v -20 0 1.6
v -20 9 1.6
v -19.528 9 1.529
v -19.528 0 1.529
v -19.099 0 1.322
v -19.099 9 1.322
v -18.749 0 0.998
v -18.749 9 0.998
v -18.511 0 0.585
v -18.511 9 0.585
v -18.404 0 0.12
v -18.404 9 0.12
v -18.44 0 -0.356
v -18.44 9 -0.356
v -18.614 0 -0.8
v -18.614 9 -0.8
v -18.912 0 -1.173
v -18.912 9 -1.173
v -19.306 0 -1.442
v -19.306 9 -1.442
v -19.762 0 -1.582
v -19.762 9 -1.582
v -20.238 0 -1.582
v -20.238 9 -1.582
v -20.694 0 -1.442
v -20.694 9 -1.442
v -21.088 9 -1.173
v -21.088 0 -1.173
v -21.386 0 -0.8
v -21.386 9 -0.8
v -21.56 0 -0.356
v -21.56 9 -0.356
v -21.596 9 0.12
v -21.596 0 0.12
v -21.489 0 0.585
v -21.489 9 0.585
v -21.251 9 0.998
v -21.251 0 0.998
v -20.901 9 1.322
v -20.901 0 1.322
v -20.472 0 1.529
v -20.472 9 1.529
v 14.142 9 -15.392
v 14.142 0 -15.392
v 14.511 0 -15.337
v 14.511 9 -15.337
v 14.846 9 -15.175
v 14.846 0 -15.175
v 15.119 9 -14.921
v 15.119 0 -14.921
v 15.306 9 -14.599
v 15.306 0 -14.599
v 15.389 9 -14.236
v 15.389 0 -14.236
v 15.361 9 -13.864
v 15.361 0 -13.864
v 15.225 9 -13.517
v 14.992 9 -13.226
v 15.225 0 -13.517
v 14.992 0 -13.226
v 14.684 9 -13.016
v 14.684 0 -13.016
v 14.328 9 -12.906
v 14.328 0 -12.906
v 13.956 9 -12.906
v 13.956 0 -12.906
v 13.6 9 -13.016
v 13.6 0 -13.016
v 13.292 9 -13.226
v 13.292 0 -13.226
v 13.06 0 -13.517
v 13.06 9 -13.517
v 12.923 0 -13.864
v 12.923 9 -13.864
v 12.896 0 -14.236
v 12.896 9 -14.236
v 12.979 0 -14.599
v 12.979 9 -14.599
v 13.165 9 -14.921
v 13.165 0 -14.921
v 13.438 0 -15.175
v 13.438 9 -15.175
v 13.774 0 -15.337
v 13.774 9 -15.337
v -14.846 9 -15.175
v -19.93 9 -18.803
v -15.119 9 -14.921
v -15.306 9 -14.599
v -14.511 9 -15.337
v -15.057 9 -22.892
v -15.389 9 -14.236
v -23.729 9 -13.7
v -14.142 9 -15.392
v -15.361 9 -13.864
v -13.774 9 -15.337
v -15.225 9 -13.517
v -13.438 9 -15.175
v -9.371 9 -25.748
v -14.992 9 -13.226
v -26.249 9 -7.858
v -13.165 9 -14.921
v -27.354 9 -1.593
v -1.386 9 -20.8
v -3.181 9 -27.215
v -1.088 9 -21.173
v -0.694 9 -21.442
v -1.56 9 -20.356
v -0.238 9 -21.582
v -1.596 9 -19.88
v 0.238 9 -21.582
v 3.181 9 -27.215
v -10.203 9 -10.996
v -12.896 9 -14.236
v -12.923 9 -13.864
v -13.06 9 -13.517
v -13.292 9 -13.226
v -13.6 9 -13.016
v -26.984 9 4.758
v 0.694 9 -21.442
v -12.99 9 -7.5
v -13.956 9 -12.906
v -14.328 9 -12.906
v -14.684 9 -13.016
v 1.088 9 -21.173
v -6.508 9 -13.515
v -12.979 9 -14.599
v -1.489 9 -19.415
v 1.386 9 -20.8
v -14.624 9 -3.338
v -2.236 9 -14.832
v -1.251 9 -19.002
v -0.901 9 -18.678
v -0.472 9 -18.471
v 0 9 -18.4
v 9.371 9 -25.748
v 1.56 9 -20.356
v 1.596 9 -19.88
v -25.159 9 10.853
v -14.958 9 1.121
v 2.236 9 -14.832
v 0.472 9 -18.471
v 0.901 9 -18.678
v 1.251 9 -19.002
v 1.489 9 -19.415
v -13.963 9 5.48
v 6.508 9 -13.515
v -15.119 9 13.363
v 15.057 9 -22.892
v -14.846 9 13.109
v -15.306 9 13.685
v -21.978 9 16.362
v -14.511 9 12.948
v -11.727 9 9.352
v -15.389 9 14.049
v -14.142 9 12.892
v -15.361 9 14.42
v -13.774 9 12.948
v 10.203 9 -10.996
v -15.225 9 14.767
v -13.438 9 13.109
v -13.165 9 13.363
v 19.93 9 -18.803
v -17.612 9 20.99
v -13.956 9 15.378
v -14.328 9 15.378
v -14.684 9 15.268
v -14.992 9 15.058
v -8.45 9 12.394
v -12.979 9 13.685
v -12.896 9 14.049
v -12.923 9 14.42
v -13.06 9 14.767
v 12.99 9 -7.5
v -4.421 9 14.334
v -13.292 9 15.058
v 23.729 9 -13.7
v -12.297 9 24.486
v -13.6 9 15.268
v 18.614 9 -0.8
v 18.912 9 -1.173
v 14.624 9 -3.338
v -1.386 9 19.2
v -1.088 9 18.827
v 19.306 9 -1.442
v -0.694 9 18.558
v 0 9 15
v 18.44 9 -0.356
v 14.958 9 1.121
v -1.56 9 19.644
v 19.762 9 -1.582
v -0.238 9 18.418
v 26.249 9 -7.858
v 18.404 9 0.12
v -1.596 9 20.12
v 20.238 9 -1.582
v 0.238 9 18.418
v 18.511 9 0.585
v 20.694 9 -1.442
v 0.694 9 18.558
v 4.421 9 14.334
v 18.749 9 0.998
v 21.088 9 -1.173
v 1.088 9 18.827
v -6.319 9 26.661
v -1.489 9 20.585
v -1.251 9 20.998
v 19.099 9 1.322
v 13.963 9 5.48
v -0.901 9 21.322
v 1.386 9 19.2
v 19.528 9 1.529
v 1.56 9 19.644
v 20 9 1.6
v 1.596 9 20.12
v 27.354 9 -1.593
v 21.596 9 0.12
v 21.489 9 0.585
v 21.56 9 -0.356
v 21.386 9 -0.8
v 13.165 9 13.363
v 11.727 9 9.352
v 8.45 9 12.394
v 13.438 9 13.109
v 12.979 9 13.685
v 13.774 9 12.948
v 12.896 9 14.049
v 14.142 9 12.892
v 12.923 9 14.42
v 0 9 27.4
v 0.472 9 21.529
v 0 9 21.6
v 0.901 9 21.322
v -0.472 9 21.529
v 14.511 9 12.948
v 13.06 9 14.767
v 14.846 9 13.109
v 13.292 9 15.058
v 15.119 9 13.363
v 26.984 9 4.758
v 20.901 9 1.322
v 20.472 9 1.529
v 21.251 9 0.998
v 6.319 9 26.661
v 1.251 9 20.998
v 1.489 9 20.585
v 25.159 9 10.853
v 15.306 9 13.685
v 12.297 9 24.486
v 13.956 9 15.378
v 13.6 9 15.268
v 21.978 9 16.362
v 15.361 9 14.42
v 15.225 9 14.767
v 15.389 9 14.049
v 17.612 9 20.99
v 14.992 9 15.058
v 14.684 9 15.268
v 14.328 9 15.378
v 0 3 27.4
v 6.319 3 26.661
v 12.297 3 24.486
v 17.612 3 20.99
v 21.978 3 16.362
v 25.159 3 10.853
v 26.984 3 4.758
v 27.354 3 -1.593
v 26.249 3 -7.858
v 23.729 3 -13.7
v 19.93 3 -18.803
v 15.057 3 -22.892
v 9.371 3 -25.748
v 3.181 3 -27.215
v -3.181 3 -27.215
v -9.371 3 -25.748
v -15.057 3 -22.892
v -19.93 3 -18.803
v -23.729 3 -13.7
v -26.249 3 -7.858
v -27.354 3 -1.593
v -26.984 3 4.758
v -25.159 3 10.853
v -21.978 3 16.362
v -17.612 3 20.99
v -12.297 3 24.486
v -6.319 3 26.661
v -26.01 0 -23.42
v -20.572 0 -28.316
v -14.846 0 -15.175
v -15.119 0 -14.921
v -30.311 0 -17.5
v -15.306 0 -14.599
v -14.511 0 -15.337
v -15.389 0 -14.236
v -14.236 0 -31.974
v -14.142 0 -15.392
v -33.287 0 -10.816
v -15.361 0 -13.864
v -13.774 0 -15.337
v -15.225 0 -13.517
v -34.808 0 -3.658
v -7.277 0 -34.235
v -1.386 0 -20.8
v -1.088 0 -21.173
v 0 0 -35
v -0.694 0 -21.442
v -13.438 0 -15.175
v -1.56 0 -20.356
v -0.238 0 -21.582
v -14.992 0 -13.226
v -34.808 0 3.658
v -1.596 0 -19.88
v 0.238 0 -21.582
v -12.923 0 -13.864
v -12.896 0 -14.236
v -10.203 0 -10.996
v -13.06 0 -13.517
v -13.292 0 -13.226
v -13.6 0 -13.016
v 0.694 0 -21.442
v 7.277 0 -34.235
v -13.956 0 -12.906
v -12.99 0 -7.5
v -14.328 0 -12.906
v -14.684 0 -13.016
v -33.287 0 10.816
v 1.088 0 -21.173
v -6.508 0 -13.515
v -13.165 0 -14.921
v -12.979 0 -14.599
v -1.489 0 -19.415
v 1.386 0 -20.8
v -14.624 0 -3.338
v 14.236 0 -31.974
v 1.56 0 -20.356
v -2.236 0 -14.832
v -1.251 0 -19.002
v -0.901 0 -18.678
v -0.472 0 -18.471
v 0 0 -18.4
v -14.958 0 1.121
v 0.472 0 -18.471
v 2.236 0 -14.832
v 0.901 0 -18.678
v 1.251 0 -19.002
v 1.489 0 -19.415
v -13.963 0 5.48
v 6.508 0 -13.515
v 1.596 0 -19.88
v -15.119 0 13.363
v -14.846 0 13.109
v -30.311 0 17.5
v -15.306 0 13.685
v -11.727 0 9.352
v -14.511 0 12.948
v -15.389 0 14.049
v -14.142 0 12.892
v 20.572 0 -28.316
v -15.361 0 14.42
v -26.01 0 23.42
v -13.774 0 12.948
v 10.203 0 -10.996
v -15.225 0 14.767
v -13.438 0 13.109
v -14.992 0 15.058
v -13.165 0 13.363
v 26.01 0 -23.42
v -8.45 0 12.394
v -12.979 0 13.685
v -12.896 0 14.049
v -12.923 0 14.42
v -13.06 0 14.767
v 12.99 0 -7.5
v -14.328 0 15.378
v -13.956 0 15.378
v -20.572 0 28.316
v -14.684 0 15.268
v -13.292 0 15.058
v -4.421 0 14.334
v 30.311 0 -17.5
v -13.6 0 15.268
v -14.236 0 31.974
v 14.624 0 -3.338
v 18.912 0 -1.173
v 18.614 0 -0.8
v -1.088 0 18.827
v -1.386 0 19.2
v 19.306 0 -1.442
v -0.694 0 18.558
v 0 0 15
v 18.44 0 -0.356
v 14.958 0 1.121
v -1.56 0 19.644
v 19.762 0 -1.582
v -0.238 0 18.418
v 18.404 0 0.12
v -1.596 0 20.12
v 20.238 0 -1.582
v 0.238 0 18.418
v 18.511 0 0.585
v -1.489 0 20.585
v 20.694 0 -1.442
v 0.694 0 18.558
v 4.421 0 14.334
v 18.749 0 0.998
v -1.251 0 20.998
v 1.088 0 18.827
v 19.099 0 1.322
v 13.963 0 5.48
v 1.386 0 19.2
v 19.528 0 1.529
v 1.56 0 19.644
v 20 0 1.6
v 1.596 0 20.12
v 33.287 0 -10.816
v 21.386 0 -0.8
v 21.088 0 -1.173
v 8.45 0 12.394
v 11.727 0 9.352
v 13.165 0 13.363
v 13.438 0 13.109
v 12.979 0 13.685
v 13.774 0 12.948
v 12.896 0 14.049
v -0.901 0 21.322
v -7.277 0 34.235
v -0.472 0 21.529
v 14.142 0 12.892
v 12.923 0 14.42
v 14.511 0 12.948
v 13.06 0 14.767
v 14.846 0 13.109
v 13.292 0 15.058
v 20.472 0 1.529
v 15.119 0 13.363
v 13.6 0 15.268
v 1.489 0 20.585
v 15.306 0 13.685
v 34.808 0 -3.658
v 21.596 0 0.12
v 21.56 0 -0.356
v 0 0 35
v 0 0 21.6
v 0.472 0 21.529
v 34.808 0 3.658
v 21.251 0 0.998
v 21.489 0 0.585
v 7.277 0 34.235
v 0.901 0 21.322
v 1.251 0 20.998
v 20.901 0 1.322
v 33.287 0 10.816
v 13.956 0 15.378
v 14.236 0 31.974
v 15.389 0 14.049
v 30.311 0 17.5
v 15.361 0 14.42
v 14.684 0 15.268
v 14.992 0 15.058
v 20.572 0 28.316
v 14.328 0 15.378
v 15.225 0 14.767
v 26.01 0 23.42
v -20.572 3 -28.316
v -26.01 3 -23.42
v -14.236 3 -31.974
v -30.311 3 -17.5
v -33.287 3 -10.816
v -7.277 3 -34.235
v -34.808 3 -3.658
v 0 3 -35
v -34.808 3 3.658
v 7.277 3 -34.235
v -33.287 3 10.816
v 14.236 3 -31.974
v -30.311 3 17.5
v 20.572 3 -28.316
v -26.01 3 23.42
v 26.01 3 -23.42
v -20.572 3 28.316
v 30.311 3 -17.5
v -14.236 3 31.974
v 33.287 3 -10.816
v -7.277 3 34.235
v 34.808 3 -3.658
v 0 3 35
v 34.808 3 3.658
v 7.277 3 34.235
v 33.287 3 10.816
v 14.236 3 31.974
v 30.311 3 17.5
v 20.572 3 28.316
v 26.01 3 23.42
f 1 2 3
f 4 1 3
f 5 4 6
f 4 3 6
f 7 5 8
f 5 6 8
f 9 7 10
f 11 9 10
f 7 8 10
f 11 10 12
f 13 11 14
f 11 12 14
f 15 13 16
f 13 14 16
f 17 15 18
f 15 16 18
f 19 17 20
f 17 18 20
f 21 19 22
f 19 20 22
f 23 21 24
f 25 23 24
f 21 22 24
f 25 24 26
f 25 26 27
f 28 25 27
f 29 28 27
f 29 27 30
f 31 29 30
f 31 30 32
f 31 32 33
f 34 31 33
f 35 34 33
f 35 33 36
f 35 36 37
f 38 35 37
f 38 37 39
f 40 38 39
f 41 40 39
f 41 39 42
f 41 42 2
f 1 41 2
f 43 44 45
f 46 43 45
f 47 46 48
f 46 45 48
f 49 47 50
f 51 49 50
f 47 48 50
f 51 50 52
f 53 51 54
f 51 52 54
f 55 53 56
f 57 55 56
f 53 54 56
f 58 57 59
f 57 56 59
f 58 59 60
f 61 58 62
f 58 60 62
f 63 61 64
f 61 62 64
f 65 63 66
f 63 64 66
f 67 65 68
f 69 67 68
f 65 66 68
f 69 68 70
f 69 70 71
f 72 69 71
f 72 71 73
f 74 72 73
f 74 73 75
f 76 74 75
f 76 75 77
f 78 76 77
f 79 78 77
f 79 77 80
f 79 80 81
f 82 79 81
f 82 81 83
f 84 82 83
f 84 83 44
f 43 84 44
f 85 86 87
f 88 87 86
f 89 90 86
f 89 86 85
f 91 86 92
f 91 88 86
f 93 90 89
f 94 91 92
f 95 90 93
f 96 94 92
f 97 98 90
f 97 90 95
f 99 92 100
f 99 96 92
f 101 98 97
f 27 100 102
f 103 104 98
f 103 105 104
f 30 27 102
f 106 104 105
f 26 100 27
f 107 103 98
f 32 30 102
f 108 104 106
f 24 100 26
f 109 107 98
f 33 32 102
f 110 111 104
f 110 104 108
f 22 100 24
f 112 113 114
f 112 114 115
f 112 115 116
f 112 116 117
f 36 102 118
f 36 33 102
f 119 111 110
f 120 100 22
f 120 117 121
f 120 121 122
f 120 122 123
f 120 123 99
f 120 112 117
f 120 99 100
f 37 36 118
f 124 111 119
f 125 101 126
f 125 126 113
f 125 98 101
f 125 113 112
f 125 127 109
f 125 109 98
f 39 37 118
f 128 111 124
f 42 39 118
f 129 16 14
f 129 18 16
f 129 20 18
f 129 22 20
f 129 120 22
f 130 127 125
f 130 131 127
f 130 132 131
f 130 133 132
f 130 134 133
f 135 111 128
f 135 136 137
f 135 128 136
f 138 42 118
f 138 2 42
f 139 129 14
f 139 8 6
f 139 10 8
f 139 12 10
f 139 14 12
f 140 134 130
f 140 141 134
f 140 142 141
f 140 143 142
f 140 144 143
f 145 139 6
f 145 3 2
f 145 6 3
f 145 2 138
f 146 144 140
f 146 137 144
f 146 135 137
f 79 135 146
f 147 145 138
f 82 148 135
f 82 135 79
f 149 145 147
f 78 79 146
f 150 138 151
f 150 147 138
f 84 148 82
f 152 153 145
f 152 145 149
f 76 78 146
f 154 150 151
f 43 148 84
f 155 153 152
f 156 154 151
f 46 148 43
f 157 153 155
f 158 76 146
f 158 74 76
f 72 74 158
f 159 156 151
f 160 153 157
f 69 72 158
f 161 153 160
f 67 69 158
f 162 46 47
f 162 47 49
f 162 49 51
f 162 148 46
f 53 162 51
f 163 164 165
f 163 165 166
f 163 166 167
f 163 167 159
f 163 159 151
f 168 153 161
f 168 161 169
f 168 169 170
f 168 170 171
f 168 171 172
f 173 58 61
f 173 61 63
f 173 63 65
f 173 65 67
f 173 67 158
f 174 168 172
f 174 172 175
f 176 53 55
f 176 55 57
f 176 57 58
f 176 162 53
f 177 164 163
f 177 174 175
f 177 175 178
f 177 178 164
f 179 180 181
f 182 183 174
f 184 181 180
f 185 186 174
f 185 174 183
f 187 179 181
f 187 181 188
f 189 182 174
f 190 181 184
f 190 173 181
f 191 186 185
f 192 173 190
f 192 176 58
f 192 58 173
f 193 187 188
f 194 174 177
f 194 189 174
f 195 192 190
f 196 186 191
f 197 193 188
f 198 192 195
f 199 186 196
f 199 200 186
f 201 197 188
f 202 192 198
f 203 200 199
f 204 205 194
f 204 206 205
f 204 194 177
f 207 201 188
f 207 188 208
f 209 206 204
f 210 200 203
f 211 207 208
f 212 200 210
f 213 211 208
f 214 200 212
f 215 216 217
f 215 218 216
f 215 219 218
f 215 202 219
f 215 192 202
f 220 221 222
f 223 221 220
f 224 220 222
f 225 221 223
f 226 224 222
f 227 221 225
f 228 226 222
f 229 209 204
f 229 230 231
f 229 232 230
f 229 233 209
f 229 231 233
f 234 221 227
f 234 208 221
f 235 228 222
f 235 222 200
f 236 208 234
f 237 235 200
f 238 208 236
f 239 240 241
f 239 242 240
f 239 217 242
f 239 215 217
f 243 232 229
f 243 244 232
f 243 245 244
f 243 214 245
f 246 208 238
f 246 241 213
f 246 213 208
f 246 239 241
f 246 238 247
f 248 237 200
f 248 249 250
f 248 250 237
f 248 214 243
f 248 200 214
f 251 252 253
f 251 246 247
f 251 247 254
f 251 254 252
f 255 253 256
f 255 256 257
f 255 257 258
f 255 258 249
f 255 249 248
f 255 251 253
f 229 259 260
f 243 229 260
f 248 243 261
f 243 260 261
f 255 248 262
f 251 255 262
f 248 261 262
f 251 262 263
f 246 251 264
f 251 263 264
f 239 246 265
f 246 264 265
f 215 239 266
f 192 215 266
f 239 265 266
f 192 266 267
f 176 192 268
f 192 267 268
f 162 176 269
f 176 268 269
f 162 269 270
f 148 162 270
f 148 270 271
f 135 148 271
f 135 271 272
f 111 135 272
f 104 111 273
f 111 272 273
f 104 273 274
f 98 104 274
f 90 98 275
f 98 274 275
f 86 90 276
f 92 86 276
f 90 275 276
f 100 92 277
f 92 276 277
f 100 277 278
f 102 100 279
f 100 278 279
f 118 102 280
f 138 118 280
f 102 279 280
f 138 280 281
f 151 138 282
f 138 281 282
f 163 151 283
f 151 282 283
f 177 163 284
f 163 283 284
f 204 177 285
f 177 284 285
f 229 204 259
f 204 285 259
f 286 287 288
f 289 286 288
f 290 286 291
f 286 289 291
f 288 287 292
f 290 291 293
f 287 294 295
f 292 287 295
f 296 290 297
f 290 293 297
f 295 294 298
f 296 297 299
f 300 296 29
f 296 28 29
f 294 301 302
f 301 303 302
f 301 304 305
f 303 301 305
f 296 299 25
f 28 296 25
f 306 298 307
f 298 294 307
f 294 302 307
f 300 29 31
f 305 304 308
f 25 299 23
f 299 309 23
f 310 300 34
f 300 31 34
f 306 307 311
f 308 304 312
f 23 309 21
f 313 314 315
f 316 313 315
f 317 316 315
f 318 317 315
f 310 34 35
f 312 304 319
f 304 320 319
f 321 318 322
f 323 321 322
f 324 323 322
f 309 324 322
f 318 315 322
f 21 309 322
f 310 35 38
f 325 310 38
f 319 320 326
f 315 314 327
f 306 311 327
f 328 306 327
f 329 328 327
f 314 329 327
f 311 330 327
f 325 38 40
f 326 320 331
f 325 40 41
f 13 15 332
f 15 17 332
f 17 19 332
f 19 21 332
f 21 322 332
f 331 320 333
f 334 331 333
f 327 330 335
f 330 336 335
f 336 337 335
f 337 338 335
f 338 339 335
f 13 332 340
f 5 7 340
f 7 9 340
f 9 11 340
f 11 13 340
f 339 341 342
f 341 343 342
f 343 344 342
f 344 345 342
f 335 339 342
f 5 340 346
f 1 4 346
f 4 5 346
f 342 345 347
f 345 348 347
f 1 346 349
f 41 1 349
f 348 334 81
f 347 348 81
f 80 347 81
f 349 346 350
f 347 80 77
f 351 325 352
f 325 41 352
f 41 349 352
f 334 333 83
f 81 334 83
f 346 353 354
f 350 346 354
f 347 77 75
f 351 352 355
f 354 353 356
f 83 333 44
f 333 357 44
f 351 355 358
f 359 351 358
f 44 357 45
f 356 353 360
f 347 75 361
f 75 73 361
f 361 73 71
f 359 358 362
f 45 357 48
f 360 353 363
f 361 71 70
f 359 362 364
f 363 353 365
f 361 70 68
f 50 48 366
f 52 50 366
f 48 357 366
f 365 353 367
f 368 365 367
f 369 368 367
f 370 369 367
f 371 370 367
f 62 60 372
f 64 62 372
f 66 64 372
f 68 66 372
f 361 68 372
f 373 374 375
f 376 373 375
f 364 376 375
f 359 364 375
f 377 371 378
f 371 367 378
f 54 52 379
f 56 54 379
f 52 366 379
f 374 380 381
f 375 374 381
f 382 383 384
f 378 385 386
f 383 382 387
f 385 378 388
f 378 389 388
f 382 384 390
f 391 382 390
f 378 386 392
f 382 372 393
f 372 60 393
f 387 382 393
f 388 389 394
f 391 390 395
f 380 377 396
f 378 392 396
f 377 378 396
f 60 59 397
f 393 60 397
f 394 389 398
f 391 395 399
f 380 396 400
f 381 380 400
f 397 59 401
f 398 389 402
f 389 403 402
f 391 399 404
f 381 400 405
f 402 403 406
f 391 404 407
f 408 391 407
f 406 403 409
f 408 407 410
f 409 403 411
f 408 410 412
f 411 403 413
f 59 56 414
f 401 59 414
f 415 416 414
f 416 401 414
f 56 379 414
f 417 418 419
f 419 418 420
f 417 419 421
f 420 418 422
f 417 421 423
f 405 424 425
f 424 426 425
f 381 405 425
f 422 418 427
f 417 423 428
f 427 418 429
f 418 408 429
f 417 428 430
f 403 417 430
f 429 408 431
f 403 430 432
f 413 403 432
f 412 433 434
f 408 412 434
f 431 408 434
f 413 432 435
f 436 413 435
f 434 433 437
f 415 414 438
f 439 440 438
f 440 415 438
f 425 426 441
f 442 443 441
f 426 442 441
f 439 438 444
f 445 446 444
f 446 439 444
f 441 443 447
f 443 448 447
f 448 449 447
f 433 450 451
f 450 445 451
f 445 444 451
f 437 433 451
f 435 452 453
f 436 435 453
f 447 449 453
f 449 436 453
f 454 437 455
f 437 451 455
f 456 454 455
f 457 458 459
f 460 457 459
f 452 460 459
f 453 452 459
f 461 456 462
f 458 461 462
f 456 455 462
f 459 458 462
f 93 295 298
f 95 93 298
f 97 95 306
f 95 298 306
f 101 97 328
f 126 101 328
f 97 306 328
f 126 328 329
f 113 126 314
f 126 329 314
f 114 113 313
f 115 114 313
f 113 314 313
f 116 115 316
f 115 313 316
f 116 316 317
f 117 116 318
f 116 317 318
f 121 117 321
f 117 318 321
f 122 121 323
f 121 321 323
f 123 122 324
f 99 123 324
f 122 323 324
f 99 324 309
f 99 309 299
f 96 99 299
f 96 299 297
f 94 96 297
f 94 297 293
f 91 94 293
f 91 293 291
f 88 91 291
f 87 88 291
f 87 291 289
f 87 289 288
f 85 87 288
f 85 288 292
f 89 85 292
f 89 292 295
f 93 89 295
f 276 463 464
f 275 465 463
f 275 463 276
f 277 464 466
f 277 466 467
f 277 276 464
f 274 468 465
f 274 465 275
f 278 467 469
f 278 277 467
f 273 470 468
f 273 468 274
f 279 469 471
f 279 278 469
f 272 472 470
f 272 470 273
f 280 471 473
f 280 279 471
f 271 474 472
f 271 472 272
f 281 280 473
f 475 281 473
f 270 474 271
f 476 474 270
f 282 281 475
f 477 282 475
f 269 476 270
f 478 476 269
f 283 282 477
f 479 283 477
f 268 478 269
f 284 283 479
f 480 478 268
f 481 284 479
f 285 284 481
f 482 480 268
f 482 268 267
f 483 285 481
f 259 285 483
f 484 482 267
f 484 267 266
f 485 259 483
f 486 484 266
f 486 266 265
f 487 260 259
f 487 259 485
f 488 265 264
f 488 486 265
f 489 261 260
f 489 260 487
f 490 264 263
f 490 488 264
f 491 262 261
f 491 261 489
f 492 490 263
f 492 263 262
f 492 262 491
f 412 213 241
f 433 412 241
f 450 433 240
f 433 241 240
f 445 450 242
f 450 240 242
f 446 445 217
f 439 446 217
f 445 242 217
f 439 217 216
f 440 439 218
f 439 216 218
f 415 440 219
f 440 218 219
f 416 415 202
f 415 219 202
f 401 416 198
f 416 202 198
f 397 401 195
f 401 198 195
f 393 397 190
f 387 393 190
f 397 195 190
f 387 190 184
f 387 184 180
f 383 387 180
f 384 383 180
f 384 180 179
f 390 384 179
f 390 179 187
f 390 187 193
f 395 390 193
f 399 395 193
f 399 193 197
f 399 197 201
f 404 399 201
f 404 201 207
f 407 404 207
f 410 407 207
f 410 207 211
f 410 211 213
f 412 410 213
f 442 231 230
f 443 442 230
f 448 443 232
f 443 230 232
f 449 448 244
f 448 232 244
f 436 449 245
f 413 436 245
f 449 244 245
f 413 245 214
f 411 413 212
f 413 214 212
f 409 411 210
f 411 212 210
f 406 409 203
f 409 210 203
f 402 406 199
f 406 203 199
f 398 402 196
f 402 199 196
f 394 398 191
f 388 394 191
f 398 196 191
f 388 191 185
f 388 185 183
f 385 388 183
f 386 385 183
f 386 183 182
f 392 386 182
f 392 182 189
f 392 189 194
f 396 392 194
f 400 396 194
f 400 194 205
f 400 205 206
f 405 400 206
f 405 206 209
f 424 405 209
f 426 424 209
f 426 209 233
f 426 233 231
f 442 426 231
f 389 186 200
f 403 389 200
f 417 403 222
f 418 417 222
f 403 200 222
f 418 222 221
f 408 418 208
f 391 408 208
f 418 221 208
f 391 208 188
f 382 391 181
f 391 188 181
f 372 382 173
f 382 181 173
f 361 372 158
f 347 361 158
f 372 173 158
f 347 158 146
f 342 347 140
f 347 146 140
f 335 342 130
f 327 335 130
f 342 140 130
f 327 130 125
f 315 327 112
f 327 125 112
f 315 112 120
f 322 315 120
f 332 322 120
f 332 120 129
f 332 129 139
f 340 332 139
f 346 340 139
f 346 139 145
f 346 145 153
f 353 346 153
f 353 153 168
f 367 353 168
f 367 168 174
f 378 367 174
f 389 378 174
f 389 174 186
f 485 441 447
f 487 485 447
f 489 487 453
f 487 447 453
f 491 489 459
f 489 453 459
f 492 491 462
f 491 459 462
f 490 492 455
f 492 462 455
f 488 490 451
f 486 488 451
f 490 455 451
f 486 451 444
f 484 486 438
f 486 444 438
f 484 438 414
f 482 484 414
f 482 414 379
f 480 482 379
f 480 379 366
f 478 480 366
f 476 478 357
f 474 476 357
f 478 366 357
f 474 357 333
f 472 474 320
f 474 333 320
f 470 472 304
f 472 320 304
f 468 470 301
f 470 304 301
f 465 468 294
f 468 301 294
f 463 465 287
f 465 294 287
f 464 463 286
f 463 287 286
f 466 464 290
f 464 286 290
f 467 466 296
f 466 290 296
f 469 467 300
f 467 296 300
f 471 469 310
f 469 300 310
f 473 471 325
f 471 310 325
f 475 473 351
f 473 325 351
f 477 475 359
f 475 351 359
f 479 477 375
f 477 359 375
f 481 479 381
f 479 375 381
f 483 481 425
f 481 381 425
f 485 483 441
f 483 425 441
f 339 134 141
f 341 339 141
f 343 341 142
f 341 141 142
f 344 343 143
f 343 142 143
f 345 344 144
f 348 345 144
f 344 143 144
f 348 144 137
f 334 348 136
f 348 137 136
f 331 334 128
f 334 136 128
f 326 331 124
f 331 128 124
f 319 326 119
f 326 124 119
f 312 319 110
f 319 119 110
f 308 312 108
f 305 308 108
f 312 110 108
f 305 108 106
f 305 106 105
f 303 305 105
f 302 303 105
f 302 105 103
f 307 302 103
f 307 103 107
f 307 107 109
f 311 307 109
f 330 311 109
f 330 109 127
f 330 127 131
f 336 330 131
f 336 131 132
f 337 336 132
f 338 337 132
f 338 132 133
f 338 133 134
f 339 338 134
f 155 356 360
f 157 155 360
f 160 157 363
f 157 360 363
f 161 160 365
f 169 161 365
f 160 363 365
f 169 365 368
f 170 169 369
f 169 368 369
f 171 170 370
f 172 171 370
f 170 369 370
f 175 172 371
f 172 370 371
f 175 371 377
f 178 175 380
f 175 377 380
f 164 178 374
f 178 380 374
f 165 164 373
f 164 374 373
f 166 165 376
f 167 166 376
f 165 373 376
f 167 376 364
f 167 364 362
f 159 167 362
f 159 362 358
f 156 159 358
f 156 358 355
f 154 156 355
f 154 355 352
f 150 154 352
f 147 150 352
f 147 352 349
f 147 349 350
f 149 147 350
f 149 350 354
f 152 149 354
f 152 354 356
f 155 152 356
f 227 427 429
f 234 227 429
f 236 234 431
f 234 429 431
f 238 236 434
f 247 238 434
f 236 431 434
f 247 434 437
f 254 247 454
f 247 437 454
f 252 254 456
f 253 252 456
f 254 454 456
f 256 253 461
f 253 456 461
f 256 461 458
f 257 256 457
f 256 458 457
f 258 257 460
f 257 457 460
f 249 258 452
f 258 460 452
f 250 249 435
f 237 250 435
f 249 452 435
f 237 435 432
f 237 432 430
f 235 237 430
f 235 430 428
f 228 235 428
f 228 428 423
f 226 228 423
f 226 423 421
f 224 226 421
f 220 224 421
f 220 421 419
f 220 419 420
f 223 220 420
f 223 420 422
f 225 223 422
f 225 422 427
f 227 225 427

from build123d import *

# Parameters (mm, degrees)
SKETCH_1_R          = 35
EXTRUDE_1_DEPTH     = 3
SKETCH_2_R          = 27.4
EXTRUDE_2_DEPTH     = 6
SKETCH_3_R          = 1.6
CUT_EXTRUDE_1_DEPTH = 51.309044912
SKETCH_4_R          = 15
CUT_EXTRUDE_2_DEPTH = 51.309044912
SKETCH_5_R          = 1.25
CUT_EXTRUDE_3_DEPTH = 51.309044912


with BuildPart() as part:
    # ｽｹｯﾁ1 → ﾎﾞｽ - 押し出し1 (new body)
    with BuildSketch(Plane(origin=(0, 0, 0), x_dir=(1, 0, 0), z_dir=(0, 1, 0))):
        with Locations(Location((0, 0, 0), (0, 0, 270))):
            Circle(SKETCH_1_R)
    extrude(amount=EXTRUDE_1_DEPTH)

    # ｽｹｯﾁ2 → ﾎﾞｽ - 押し出し2 (add)
    with BuildSketch(Plane(origin=(0, 3, 0), x_dir=(1, 0, 0), z_dir=(0, 1, 0))):
        with Locations(Location((0, 0, 0), (0, 0, 270))):
            Circle(SKETCH_2_R)
    extrude(amount=EXTRUDE_2_DEPTH)

    # ｽｹｯﾁ3 → ｶｯﾄ - 押し出し1 (cut, through all)
    with BuildSketch(Plane(origin=(0, 9, 0), x_dir=(1, 0, 0), z_dir=(0, 1, 0))):
        with Locations(Location((0, 20, 0), (0, 0, 270))):
            Circle(SKETCH_3_R)
        with Locations(Location((20, 0, 0), (0, 0, 270))):
            Circle(SKETCH_3_R)
        with Locations(Location((0, -20, 0), (0, 0, 270))):
            Circle(SKETCH_3_R)
        with Locations(Location((-20, 0, 0), (0, 0, 270))):
            Circle(SKETCH_3_R)
    extrude(amount=-CUT_EXTRUDE_1_DEPTH, mode=Mode.SUBTRACT)

    # ｽｹｯﾁ4 → ｶｯﾄ - 押し出し2 (cut, through all)
    with BuildSketch(Plane(origin=(0, 9, 0), x_dir=(1, 0, 0), z_dir=(0, 1, 0))):
        with Locations(Location((0, 0, 0), (0, 0, 270))):
            Circle(SKETCH_4_R)
    extrude(amount=-CUT_EXTRUDE_2_DEPTH, mode=Mode.SUBTRACT)

    # ｽｹｯﾁ5 → ｶｯﾄ - 押し出し3 (cut, through all)
    with BuildSketch(Plane.XZ):
        with Locations(Location((-14.142135624, 14.142135624, 0), (0, 0, 270))):
            Circle(SKETCH_5_R)
        with Locations(Location((14.142135624, 14.142135624, 0), (0, 0, 270))):
            Circle(SKETCH_5_R)
        with Locations(Location((14.142135624, -14.142135624, 0), (0, 0, 270))):
            Circle(SKETCH_5_R)
        with Locations(Location((-14.142135624, -14.142135624, 0), (0, 0, 270))):
            Circle(SKETCH_5_R)
    extrude(amount=-CUT_EXTRUDE_3_DEPTH, mode=Mode.SUBTRACT)


solid = part.part
